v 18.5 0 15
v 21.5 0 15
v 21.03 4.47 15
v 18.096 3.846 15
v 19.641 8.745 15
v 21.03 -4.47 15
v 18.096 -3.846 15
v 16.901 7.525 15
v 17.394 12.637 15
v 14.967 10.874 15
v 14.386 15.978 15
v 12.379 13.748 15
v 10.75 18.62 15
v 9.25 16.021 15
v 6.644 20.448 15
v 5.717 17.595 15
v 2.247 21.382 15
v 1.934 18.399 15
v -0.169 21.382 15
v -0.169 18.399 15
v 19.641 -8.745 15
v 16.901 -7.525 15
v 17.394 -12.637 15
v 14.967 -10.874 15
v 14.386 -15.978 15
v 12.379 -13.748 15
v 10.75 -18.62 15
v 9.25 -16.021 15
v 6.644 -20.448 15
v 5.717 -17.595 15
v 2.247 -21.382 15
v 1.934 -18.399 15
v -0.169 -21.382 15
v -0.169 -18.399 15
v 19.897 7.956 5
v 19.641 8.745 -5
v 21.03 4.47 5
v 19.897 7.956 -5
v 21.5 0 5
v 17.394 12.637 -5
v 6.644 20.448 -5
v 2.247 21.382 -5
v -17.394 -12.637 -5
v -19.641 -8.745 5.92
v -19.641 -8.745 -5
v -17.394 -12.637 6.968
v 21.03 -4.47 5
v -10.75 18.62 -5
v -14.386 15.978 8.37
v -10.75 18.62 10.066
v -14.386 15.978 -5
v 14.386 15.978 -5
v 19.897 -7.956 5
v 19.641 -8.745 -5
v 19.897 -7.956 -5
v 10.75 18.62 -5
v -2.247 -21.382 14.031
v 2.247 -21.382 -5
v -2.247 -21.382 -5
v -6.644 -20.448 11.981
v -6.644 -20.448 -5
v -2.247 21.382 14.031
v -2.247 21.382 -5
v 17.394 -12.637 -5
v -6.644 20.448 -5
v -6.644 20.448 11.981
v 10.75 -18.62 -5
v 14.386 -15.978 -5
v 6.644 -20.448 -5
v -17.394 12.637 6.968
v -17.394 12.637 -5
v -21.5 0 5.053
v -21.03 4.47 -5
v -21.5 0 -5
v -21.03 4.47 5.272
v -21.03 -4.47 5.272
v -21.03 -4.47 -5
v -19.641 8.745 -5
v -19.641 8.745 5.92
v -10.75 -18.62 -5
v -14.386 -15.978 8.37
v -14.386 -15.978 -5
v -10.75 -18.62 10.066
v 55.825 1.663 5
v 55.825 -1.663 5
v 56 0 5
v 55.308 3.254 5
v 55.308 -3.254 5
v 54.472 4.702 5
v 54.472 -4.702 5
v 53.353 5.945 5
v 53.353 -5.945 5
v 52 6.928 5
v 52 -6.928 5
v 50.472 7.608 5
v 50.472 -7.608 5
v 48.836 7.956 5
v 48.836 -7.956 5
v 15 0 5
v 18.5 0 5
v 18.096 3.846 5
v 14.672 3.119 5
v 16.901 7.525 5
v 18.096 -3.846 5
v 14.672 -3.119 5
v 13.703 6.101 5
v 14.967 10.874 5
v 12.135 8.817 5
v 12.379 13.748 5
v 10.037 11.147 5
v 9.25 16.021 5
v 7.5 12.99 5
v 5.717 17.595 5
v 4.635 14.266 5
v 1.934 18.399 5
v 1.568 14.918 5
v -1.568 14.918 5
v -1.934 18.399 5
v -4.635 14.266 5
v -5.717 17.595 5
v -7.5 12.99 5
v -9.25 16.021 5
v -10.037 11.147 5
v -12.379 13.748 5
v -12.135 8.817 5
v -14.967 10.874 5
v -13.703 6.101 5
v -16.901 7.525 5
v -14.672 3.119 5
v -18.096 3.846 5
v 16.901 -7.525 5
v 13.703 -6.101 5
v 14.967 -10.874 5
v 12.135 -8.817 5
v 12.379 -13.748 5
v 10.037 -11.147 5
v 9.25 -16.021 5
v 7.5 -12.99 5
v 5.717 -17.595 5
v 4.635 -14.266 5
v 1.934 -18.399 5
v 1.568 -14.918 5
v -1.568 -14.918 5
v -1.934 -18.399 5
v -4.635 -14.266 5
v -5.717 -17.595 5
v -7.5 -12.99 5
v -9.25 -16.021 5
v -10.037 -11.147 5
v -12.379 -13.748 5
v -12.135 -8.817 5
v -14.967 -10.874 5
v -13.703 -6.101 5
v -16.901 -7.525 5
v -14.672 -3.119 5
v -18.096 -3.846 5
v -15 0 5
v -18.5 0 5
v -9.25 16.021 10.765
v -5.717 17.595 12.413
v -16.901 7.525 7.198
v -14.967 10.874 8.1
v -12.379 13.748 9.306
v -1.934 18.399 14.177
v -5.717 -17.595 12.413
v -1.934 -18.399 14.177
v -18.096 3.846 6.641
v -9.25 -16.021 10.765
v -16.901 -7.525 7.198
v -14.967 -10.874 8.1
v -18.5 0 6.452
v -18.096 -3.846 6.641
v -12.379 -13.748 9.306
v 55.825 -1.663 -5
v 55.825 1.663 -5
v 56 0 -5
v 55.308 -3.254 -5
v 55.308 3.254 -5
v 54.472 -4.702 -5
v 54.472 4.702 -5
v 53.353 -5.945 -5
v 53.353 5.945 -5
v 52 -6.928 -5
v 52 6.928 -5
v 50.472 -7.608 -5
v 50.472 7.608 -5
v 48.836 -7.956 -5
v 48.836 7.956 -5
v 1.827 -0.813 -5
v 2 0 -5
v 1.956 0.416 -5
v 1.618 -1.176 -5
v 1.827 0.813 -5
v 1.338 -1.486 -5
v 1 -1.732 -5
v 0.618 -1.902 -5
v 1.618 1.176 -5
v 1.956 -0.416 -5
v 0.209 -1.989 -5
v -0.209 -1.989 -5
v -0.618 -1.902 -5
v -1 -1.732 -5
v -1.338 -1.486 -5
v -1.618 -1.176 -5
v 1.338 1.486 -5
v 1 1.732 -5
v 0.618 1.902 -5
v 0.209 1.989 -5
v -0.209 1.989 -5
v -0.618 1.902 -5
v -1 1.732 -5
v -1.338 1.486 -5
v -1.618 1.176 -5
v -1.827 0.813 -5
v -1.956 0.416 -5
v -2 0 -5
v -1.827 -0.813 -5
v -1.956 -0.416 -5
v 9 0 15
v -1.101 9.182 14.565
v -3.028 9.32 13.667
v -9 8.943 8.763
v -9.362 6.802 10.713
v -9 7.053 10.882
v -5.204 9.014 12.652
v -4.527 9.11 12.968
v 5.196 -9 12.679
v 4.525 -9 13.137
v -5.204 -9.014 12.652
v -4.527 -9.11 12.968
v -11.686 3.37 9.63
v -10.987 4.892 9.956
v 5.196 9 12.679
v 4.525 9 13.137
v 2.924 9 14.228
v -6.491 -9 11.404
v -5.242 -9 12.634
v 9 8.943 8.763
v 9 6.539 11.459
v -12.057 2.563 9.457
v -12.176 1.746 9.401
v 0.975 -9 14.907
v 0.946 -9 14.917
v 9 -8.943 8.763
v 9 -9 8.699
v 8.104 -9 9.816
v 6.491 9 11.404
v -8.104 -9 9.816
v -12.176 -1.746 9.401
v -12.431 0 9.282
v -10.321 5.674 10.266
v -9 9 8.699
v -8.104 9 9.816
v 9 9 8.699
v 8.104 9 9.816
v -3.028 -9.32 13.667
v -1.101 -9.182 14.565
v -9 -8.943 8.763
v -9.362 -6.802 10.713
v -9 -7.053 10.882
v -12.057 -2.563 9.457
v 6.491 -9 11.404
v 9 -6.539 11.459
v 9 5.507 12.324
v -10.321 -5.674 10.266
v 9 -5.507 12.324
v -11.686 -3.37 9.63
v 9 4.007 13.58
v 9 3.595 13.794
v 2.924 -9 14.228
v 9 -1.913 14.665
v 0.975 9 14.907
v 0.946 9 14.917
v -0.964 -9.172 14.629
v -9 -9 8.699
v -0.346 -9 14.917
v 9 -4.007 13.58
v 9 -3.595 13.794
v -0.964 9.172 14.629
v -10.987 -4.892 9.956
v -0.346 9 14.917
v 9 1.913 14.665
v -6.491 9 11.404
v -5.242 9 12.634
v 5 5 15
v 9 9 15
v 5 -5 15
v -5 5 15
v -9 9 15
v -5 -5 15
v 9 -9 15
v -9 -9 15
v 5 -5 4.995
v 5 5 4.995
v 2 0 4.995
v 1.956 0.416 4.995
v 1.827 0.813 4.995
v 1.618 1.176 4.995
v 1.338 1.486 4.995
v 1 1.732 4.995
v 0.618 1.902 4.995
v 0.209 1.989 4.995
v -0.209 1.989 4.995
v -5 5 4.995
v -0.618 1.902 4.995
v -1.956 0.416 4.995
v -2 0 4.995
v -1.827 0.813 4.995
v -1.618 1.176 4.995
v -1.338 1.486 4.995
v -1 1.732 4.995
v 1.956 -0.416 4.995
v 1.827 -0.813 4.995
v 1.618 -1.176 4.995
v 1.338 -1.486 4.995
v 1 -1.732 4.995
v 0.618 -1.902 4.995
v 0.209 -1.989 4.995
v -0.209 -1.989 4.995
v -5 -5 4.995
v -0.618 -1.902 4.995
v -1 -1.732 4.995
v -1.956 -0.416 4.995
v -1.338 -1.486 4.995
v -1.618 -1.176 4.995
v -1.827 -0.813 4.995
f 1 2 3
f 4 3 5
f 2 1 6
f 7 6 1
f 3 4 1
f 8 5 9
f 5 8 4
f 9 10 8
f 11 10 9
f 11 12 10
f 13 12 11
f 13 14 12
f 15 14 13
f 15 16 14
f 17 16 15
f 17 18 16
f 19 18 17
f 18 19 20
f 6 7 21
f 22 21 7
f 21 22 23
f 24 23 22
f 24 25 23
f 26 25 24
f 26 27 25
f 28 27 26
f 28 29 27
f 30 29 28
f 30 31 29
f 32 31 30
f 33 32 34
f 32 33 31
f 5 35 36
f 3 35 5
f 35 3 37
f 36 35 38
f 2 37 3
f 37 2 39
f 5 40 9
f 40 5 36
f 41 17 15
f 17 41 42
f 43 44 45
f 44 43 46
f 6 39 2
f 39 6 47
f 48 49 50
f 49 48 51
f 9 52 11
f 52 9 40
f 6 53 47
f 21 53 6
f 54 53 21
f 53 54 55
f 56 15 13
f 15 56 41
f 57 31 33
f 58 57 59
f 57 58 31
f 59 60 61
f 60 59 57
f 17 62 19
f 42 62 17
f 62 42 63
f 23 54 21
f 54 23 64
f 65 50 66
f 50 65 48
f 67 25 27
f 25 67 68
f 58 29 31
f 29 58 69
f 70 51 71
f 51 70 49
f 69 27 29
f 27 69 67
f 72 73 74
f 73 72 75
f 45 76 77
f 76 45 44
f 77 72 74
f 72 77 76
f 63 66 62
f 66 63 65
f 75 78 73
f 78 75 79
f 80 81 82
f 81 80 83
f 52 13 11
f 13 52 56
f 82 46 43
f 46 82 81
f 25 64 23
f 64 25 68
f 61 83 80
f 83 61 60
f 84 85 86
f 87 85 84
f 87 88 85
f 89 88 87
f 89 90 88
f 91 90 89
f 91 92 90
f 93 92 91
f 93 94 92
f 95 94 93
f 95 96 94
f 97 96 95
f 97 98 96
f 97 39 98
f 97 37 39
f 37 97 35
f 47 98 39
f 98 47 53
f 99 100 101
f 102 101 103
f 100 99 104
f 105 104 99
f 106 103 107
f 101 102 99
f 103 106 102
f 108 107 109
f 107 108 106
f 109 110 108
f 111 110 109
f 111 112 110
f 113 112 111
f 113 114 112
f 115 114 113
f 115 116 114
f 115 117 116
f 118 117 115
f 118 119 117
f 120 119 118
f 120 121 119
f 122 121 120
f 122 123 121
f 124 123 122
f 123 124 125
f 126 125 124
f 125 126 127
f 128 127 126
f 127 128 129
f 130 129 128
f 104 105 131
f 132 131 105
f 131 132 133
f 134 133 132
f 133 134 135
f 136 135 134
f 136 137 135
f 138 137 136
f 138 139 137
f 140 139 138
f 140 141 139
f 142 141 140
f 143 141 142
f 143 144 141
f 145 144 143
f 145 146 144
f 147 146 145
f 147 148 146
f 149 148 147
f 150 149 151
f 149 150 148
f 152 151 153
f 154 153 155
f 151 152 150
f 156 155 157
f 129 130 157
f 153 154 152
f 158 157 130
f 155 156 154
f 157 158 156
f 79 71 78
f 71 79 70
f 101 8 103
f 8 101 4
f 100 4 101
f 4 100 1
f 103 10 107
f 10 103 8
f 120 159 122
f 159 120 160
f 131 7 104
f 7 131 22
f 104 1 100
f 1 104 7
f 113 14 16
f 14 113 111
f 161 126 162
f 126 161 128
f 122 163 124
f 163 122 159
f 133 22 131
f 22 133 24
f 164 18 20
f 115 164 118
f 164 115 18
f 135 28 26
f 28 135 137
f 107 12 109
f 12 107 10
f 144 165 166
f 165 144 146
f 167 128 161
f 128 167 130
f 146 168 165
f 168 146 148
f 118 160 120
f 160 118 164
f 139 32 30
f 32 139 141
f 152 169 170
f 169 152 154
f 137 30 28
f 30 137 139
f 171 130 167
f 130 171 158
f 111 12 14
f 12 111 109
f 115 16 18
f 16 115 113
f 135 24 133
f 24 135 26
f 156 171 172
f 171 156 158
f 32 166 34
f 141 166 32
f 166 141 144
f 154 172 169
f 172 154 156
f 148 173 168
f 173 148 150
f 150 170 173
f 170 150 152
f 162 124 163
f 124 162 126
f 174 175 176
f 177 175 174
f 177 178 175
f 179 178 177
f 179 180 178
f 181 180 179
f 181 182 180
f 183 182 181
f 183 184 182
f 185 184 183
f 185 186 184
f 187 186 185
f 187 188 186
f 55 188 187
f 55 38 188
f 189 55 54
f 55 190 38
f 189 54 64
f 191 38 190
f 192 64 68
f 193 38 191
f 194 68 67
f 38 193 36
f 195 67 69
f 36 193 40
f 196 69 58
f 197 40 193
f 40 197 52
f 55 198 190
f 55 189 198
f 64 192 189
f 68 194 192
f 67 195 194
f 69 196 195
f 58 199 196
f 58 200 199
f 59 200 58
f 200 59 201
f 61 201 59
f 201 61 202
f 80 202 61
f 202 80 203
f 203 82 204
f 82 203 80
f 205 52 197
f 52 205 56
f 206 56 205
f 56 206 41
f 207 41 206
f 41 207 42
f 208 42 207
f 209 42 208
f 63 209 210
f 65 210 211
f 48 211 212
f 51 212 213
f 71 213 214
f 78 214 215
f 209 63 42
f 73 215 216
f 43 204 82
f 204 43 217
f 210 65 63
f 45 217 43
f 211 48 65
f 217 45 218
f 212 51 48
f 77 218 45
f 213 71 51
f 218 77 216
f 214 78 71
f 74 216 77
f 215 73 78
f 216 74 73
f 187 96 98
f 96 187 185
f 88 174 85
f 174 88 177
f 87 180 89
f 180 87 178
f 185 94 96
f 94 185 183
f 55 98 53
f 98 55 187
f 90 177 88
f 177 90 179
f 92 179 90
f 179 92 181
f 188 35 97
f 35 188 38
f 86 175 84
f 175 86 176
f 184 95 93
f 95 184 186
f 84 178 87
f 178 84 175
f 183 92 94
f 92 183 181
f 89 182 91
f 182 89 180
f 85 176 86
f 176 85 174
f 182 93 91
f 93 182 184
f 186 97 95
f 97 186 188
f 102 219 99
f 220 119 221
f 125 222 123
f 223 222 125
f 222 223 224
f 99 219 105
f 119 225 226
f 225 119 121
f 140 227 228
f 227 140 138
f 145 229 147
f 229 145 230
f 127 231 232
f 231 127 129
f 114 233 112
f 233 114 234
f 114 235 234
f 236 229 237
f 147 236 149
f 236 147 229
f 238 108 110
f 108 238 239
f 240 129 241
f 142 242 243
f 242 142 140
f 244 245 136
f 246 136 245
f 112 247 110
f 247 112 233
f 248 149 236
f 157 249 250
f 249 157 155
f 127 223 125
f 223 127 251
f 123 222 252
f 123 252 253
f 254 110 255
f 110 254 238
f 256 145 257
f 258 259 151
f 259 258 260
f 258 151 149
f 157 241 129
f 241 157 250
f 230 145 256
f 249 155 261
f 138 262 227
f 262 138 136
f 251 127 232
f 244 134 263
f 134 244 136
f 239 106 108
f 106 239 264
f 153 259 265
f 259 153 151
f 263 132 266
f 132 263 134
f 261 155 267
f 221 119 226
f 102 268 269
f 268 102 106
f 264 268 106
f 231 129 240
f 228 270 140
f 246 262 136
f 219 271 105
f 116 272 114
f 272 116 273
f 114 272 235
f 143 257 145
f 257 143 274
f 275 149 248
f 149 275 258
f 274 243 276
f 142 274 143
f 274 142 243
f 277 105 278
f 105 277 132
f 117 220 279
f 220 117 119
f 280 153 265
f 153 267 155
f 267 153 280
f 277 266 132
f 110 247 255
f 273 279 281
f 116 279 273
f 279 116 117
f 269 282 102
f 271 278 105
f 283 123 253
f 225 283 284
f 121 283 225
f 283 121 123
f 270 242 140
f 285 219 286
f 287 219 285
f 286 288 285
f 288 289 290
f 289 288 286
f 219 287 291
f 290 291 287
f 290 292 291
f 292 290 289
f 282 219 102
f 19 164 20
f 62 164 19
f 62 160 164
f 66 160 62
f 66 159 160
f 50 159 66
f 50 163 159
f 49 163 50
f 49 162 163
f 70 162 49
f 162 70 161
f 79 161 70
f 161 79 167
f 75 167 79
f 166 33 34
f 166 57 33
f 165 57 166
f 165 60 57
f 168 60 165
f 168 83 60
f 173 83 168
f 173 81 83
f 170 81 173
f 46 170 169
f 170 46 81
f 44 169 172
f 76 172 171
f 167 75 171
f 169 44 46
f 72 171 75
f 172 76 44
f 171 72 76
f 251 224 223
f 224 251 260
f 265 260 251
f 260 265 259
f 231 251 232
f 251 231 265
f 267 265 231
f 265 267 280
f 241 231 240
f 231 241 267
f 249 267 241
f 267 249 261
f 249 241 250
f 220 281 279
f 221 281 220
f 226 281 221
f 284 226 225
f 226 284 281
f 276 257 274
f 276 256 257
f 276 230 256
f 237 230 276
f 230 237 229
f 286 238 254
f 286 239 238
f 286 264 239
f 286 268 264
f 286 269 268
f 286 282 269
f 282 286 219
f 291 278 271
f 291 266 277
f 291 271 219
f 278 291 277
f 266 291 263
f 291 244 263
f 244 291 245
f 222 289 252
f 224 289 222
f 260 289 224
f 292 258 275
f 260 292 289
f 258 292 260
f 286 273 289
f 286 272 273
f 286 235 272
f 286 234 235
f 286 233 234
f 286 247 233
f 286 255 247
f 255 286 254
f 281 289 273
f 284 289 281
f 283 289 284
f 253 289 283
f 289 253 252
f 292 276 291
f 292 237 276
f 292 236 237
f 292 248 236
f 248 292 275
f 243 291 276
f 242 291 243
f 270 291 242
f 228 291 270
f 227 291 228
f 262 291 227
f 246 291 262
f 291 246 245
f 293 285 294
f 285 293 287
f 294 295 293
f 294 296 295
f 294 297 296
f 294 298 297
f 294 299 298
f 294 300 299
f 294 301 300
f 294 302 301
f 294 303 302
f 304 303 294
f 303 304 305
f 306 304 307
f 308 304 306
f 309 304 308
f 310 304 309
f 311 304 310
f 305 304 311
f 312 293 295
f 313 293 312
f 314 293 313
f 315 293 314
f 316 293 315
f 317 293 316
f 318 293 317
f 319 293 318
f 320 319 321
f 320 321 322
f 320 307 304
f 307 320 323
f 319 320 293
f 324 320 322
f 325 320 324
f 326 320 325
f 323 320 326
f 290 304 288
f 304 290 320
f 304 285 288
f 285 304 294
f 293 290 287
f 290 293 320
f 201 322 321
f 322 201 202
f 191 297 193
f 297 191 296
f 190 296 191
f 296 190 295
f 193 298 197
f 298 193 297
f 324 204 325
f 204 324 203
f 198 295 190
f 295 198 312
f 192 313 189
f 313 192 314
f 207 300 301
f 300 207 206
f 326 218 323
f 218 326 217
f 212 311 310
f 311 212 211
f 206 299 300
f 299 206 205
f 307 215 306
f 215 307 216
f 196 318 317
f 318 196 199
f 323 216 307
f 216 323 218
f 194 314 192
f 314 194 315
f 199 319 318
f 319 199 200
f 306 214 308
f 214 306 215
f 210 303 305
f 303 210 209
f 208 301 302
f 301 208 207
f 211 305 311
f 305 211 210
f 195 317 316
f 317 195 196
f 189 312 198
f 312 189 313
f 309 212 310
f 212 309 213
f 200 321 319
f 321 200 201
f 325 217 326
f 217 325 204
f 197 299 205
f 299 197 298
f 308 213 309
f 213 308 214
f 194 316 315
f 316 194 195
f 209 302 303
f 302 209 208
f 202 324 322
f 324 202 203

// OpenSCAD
fa=5; $fs=0.1;

difference(){

union(){
difference(){

union(){
    cylinder(h=10, r=21.5, center=true);

    hull(){
        cylinder(h=10, r=8, center=true);
        translate([48,0,0]) cylinder(h=10, r=8, center=true);
    }
    

 
difference(){
 
        translate([0,0,10]) cylinder(h=10, r= 21.5, center=true);
        translate([0,0,10]) cylinder(h=10.01, r= 21.5-3, center=true);
    
    
}

translate([0,0,10]) cylinder(h=10, r1= 15, r2=9, center=true);
}


translate([-12, 0, 15]) rotate([0, -25,0 ]) cube([40,50,10], center=true);
}

translate([0,0,10]) cube([18,18,10], center=true);
}

translate([0,0,10]) cube([10,10,10.01], center=true);
cylinder(h=10.01, r=2, center=true);

}
